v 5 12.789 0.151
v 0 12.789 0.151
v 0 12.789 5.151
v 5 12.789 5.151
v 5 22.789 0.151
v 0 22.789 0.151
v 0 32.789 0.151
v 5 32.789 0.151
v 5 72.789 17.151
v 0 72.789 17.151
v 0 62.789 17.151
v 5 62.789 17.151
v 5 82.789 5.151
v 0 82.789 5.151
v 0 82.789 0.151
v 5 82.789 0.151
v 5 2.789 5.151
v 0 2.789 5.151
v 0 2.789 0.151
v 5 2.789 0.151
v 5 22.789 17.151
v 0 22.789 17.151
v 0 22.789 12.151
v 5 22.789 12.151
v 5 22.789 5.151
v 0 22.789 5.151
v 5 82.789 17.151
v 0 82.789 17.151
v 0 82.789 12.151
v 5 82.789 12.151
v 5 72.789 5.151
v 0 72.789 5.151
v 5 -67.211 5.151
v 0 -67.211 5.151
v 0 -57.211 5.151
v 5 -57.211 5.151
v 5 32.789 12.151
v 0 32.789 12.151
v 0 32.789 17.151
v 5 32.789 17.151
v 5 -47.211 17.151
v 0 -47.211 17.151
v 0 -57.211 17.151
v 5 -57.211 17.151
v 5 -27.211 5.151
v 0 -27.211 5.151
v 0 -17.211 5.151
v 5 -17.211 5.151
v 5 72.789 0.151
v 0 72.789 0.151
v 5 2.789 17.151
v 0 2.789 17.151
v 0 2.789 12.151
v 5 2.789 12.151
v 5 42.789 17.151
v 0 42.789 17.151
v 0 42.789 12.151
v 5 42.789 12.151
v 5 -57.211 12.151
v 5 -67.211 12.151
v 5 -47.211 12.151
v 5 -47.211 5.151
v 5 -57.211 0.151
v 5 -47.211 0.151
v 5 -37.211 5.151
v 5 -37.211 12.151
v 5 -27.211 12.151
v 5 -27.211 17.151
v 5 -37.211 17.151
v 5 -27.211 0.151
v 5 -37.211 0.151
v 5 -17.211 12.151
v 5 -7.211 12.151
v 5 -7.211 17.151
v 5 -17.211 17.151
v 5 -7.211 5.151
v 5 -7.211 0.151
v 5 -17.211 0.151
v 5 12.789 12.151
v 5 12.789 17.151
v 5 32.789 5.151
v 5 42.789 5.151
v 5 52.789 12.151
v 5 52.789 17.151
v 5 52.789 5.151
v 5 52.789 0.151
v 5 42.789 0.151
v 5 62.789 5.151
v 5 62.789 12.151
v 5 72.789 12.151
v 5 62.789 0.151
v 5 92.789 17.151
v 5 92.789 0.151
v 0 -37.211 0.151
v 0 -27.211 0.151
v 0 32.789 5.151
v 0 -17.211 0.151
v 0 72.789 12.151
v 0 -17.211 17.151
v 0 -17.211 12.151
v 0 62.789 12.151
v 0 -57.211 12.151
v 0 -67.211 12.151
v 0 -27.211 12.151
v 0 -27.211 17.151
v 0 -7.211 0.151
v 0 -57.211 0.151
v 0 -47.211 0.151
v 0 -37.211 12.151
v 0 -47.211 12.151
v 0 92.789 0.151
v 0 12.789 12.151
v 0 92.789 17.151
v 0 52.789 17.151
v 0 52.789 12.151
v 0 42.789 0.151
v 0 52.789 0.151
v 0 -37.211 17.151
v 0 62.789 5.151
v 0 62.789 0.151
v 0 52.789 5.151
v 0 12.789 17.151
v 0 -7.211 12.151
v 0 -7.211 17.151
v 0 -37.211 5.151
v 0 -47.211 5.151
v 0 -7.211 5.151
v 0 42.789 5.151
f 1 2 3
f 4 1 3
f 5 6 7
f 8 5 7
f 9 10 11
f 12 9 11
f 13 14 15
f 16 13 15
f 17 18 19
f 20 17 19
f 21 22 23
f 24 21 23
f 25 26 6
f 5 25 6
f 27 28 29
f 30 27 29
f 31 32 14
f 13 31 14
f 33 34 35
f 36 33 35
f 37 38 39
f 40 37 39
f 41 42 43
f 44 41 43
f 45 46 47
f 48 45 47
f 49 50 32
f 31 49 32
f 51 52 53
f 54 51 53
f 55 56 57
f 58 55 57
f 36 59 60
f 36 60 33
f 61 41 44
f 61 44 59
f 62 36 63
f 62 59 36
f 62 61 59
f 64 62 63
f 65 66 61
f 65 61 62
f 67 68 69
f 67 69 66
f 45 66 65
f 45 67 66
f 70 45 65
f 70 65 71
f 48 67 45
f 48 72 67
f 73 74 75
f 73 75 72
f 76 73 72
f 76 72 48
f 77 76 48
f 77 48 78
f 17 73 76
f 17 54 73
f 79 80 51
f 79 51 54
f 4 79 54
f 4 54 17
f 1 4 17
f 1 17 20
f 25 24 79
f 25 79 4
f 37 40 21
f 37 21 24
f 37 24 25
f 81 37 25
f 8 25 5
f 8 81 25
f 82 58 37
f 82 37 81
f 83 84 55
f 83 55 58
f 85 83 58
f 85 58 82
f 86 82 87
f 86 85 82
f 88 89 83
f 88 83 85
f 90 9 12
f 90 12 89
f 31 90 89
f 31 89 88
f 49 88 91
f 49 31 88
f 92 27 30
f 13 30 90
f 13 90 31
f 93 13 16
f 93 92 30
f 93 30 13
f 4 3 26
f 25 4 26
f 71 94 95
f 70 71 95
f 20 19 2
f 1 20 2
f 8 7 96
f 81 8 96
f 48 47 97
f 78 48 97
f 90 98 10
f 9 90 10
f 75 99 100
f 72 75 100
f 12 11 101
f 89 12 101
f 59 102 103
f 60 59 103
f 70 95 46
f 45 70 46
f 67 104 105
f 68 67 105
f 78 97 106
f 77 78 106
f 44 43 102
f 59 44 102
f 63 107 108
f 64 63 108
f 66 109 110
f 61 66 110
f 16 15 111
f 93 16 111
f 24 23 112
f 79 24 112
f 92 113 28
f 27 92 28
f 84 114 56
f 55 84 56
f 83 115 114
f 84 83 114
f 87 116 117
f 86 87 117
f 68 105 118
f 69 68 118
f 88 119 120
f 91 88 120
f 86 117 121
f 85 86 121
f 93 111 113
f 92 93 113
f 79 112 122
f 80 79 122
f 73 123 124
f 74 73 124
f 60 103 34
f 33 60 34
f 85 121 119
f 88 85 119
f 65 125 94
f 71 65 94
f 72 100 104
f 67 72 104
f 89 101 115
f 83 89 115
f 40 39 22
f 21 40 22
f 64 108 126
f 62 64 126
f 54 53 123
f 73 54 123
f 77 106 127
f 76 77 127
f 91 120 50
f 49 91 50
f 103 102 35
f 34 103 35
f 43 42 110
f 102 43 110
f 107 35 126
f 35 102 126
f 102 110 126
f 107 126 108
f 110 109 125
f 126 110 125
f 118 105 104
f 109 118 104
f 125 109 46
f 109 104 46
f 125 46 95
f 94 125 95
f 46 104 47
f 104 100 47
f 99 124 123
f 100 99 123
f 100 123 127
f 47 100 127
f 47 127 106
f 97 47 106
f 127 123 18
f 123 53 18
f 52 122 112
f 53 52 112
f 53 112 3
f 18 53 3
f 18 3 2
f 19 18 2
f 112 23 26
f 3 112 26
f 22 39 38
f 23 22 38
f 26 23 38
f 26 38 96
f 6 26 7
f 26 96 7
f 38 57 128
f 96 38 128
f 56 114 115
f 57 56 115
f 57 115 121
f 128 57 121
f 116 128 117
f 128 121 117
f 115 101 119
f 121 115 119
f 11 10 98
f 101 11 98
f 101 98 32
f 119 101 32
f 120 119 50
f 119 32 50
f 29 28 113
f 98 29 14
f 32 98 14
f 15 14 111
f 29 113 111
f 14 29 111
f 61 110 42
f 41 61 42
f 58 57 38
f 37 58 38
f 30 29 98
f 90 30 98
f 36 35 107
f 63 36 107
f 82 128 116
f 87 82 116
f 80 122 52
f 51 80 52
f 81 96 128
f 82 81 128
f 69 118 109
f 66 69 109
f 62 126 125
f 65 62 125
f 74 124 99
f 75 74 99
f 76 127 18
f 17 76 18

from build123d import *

# Parameters (mm, degrees)
SALIENTE_EXTRUIR1_DEPTH = 5


with BuildPart() as part:
    # Croquis1 → Saliente-Extruir1 (new body)
    with BuildSketch(Plane(origin=(0, 0, 0), x_dir=(0, 0, -1), z_dir=(1, 0, 0))):
        Polygon((-17.15051747, 72.789115646), (-17.15051747, 62.789115646), (-12.15051747, 62.789115646), (-12.15051747, 52.789115646), (-17.15051747, 52.789115646), (-17.15051747, 42.789115646), (-12.15051747, 42.789115646), (-12.15051747, 32.789115646), (-17.15051747, 32.789115646), (-17.15051747, 22.789115646), (-12.15051747, 22.789115646), (-12.15051747, 12.789115646), (-17.15051747, 12.789115646), (-17.15051747, 2.789115646), (-12.15051747, 2.789115646), (-12.15051747, -7.210884354), (-17.15051747, -7.210884354), (-17.15051747, -17.210884354), (-12.15051747, -17.210884354), (-12.15051747, -27.210884354), (-17.15051747, -27.210884354), (-17.15051747, -37.210884354), (-12.15051747, -37.210884354), (-12.15051747, -47.210884354), (-17.15051747, -47.210884354), (-17.15051747, -57.210884354), (-12.15051747, -57.210884354), (-12.15051747, -67.210884354), (-5.15051747, -67.210884354), (-5.15051747, -57.210884354), (-0.15051747, -57.210884354), (-0.15051747, -47.210884354), (-5.15051747, -47.210884354), (-5.15051747, -37.210884354), (-0.15051747, -37.210884354), (-0.15051747, -27.210884354), (-5.15051747, -27.210884354), (-5.15051747, -17.210884354), (-0.15051747, -17.210884354), (-0.15051747, -7.210884354), (-5.15051747, -7.210884354), (-5.15051747, 2.789115646), (-0.15051747, 2.789115646), (-0.15051747, 12.789115646), (-5.15051747, 12.789115646), (-5.15051747, 22.789115646), (-0.15051747, 22.789115646), (-0.15051747, 32.789115646), (-5.15051747, 32.789115646), (-5.15051747, 42.789115646), (-0.15051747, 42.789115646), (-0.15051747, 52.789115646), (-5.15051747, 52.789115646), (-5.15051747, 62.789115646), (-0.15051747, 62.789115646), (-0.15051747, 72.789115646), (-5.15051747, 72.789115646), (-5.15051747, 82.789115646), (-0.15051747, 82.789115646), (-0.15051747, 92.789115646), (-17.15051747, 92.789115646), (-17.15051747, 82.789115646), (-12.15051747, 82.789115646), (-12.15051747, 72.789115646), align=None)
    extrude(amount=SALIENTE_EXTRUIR1_DEPTH)


solid = part.part
